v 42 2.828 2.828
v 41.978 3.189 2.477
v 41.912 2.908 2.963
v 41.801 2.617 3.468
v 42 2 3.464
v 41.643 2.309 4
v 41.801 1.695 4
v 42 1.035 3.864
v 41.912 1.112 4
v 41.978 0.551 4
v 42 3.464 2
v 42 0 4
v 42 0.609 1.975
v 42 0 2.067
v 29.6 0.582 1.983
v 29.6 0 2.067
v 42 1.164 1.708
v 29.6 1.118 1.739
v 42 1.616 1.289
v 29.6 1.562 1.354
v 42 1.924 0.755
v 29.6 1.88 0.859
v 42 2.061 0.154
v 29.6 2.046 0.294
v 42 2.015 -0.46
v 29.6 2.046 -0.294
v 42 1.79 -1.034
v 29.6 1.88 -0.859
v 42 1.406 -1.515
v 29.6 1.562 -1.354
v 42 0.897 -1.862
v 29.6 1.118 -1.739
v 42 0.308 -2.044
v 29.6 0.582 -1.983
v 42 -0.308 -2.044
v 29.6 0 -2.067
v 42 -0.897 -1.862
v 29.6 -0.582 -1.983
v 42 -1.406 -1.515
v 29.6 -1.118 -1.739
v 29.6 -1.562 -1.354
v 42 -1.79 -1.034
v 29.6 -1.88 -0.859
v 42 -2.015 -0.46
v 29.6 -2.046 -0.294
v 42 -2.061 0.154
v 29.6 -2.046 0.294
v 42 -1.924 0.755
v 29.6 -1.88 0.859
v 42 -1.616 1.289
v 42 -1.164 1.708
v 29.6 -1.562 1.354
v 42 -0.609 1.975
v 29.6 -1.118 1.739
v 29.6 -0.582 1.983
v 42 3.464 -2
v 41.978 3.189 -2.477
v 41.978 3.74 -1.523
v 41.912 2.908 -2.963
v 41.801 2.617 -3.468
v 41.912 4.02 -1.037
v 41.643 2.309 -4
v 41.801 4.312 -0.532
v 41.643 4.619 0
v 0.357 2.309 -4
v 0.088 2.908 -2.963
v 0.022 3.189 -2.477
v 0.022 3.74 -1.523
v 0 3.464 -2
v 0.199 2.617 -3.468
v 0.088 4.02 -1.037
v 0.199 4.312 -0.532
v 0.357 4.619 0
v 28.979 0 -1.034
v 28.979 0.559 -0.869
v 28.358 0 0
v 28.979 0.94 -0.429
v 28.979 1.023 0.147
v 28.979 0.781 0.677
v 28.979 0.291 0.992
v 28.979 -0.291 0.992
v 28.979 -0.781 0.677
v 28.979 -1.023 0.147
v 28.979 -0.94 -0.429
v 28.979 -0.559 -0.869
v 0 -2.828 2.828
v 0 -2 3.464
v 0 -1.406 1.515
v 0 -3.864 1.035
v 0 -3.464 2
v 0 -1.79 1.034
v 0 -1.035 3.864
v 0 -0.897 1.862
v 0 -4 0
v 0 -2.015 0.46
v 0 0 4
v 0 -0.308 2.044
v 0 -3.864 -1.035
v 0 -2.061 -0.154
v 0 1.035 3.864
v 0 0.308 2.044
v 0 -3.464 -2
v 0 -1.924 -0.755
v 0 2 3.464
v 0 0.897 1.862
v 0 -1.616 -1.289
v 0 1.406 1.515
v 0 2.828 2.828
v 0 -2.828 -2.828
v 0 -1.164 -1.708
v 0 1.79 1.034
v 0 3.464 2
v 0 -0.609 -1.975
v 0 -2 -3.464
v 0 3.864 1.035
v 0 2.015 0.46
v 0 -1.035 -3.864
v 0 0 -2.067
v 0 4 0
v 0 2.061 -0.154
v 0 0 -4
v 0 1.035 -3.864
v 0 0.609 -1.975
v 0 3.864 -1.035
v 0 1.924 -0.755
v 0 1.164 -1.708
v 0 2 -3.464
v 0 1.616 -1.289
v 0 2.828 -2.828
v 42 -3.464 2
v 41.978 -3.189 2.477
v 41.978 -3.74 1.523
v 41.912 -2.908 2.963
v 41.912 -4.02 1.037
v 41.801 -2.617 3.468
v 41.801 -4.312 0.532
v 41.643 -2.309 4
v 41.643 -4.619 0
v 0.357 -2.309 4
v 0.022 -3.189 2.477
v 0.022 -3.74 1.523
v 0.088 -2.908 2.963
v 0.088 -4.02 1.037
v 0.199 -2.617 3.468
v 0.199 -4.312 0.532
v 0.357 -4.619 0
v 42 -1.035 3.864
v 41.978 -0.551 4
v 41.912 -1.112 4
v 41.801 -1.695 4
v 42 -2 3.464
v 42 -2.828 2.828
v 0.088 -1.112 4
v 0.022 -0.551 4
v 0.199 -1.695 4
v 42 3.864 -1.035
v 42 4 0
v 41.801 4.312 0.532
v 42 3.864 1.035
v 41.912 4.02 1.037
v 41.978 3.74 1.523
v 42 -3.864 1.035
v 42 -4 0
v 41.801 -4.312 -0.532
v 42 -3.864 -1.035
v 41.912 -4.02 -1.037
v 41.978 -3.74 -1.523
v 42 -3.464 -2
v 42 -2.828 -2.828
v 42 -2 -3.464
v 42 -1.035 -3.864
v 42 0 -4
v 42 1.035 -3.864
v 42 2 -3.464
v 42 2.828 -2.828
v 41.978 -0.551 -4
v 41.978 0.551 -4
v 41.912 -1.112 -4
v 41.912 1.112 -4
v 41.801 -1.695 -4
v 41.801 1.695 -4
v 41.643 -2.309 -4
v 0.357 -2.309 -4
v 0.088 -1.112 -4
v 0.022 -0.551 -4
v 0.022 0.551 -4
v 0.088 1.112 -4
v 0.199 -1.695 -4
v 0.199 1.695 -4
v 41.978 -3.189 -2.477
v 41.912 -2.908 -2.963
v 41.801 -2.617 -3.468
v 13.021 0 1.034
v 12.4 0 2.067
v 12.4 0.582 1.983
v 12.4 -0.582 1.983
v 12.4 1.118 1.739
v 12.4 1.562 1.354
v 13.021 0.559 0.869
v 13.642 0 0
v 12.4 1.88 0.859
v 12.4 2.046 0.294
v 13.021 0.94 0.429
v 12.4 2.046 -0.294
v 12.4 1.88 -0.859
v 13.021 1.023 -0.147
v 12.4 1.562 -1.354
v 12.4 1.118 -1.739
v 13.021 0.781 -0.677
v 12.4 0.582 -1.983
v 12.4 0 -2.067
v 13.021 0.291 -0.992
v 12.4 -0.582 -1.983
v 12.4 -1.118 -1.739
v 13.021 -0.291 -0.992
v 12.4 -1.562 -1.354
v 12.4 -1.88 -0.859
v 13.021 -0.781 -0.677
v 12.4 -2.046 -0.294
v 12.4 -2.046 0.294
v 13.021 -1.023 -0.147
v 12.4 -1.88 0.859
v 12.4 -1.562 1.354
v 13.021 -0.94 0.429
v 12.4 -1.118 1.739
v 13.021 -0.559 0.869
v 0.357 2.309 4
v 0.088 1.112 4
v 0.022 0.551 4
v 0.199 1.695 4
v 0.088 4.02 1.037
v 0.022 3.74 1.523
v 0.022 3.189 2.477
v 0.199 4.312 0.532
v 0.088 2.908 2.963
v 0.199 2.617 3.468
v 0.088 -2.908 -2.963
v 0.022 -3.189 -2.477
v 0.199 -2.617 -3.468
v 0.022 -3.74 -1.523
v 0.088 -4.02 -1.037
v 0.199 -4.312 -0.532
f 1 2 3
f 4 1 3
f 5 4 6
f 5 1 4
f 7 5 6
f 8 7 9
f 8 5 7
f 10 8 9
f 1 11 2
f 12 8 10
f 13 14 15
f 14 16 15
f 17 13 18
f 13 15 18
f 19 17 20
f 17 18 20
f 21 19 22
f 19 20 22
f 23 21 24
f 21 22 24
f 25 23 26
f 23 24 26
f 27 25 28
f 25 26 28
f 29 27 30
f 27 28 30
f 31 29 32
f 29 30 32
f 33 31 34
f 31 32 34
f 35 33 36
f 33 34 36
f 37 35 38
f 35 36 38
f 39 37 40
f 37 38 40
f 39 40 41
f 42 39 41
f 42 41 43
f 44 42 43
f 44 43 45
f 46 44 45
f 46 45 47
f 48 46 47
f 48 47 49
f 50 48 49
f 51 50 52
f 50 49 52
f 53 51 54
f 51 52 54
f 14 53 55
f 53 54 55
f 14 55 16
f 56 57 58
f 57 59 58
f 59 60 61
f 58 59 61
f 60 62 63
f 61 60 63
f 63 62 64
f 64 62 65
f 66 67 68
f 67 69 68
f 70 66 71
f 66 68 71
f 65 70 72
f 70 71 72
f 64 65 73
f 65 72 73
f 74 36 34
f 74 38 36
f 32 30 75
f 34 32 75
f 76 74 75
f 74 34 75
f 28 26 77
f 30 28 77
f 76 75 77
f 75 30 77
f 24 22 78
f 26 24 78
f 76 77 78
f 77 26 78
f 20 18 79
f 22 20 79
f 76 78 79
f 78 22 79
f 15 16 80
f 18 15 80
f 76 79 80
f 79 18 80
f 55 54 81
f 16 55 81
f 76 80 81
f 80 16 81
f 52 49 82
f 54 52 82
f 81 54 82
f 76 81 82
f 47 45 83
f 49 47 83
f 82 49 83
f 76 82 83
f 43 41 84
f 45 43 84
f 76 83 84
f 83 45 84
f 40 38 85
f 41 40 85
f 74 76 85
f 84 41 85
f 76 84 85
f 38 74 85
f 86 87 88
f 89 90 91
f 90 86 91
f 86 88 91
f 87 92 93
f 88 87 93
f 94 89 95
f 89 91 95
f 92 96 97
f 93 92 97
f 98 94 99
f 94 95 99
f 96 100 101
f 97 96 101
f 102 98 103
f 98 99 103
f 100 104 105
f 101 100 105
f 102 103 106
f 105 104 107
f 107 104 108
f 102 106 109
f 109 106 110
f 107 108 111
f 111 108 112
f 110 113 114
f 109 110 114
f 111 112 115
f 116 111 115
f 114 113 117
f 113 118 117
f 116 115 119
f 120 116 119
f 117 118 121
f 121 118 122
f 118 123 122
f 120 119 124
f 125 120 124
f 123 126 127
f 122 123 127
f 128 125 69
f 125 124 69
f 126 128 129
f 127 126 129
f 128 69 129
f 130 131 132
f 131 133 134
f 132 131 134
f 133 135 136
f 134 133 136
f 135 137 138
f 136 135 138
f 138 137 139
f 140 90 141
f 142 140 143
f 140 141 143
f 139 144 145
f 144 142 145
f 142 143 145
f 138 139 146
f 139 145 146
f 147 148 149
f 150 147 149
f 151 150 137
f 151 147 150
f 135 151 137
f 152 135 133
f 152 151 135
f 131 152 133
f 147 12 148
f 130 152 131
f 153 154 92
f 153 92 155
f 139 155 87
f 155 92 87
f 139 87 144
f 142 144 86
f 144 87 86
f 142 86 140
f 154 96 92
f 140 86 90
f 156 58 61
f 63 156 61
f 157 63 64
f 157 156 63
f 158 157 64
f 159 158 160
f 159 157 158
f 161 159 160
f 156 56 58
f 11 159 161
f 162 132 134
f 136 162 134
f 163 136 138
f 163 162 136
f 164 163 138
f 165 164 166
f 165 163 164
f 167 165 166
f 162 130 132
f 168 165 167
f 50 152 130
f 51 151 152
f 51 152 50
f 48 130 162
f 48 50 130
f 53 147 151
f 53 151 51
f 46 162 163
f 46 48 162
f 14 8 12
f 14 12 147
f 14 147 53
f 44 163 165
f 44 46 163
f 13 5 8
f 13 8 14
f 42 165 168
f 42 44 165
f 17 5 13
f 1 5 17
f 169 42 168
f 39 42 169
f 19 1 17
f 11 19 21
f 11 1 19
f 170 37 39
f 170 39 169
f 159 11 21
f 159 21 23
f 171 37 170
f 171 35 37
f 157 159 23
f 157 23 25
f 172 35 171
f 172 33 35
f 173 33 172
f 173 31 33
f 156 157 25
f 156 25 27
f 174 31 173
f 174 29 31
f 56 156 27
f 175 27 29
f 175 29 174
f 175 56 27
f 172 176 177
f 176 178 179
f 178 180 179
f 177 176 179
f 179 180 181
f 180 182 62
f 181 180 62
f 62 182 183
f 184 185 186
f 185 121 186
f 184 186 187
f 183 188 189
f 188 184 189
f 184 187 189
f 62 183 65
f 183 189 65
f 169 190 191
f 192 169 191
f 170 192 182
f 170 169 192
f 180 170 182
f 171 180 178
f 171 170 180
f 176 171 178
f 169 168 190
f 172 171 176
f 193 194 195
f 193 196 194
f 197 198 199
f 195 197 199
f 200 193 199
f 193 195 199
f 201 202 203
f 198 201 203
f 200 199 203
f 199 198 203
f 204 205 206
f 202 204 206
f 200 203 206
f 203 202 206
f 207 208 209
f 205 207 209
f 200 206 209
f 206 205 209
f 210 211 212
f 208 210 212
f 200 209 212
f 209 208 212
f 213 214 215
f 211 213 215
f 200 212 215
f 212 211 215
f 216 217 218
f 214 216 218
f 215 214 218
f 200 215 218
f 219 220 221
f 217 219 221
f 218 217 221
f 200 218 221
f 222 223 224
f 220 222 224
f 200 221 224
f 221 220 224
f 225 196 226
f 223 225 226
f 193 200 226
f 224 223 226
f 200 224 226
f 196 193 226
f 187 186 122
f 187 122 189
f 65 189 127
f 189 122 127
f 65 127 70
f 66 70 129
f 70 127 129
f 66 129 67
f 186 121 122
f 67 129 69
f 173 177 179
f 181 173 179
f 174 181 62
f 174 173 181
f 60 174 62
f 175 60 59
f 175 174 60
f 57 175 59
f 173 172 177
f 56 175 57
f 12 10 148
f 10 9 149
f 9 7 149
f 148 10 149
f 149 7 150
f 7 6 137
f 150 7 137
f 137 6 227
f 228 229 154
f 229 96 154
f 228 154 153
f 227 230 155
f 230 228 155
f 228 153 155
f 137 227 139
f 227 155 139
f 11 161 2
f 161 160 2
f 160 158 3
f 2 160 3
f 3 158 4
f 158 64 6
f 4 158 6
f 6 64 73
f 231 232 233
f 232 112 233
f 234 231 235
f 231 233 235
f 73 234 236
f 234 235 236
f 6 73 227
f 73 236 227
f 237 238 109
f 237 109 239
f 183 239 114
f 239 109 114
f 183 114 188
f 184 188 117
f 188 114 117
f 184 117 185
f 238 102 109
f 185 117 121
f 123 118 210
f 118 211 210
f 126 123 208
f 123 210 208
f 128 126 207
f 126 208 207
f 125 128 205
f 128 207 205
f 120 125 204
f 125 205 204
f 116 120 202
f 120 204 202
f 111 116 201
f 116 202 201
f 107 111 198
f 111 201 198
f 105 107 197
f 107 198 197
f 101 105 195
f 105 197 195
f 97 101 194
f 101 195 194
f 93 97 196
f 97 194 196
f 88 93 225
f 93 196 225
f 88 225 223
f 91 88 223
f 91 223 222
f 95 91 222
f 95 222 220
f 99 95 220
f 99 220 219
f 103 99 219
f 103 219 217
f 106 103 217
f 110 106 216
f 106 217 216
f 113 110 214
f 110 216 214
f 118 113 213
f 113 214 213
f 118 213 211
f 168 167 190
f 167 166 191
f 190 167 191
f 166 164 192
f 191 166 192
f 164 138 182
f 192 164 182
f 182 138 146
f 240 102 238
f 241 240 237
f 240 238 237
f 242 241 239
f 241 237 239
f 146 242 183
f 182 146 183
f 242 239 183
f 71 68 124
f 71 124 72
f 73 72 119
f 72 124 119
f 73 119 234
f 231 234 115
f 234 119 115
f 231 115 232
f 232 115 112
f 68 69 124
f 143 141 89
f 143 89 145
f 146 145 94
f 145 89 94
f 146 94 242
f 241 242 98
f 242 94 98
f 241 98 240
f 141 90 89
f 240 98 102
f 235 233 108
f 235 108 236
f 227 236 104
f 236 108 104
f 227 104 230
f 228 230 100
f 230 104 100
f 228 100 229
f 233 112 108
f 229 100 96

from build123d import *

# Parameters (mm, degrees)
BOSS_EXTRUDE1_DEPTH = 42
TAP1_D              = 4.134
TAP1_DEPTH          = 12.4
TAP1_TIP            = 1.2419789
TAP2_D              = 4.134
TAP2_DEPTH          = 12.4
TAP2_TIP            = 1.2419789


with BuildPart() as part:
    # Sketch1 → Boss-Extrude1 (new body)
    with BuildSketch(Plane(origin=(0, 0, 0), x_dir=(0, 0, -1), z_dir=(1, 0, 0))):
        Polygon((0, -4.618802154), (4, -2.309401077), (4, 2.309401077), (0, 4.618802154), (-4, 2.309401077), (-4, -2.309401077), align=None)
    extrude(amount=BOSS_EXTRUDE1_DEPTH)

    # Sketch2 → Cut-Revolve1 (revolve, cut)
    with BuildSketch(Plane.XY):
        Polygon((0, 4.618802154), (0.35726559, 4.618802154), (0, 4), align=None)
        Polygon((41.64273441, 4.618802154), (42, 4), (42, 4.618802154), align=None)
    revolve(axis=Axis((0, 0, 0), (1, 0, 0)), mode=Mode.SUBTRACT)

    # Tap1
    with Locations(Plane.ZY):
        with Locations((0, 0)):
            Hole(TAP1_D / 2, depth=TAP1_DEPTH)
            with Locations((0, 0, -(TAP1_DEPTH + TAP1_TIP / 2))):  # 118° drill point
                Cone(0, TAP1_D / 2, TAP1_TIP, mode=Mode.SUBTRACT)

    # Tap2
    with Locations(Plane(origin=(42, 0, 0), x_dir=(0, 0, -1), z_dir=(1, 0, 0))):
        with Locations((0, 0)):
            Hole(TAP2_D / 2, depth=TAP2_DEPTH)
            with Locations((0, 0, -(TAP2_DEPTH + TAP2_TIP / 2))):  # 118° drill point
                Cone(0, TAP2_D / 2, TAP2_TIP, mode=Mode.SUBTRACT)


solid = part.part
